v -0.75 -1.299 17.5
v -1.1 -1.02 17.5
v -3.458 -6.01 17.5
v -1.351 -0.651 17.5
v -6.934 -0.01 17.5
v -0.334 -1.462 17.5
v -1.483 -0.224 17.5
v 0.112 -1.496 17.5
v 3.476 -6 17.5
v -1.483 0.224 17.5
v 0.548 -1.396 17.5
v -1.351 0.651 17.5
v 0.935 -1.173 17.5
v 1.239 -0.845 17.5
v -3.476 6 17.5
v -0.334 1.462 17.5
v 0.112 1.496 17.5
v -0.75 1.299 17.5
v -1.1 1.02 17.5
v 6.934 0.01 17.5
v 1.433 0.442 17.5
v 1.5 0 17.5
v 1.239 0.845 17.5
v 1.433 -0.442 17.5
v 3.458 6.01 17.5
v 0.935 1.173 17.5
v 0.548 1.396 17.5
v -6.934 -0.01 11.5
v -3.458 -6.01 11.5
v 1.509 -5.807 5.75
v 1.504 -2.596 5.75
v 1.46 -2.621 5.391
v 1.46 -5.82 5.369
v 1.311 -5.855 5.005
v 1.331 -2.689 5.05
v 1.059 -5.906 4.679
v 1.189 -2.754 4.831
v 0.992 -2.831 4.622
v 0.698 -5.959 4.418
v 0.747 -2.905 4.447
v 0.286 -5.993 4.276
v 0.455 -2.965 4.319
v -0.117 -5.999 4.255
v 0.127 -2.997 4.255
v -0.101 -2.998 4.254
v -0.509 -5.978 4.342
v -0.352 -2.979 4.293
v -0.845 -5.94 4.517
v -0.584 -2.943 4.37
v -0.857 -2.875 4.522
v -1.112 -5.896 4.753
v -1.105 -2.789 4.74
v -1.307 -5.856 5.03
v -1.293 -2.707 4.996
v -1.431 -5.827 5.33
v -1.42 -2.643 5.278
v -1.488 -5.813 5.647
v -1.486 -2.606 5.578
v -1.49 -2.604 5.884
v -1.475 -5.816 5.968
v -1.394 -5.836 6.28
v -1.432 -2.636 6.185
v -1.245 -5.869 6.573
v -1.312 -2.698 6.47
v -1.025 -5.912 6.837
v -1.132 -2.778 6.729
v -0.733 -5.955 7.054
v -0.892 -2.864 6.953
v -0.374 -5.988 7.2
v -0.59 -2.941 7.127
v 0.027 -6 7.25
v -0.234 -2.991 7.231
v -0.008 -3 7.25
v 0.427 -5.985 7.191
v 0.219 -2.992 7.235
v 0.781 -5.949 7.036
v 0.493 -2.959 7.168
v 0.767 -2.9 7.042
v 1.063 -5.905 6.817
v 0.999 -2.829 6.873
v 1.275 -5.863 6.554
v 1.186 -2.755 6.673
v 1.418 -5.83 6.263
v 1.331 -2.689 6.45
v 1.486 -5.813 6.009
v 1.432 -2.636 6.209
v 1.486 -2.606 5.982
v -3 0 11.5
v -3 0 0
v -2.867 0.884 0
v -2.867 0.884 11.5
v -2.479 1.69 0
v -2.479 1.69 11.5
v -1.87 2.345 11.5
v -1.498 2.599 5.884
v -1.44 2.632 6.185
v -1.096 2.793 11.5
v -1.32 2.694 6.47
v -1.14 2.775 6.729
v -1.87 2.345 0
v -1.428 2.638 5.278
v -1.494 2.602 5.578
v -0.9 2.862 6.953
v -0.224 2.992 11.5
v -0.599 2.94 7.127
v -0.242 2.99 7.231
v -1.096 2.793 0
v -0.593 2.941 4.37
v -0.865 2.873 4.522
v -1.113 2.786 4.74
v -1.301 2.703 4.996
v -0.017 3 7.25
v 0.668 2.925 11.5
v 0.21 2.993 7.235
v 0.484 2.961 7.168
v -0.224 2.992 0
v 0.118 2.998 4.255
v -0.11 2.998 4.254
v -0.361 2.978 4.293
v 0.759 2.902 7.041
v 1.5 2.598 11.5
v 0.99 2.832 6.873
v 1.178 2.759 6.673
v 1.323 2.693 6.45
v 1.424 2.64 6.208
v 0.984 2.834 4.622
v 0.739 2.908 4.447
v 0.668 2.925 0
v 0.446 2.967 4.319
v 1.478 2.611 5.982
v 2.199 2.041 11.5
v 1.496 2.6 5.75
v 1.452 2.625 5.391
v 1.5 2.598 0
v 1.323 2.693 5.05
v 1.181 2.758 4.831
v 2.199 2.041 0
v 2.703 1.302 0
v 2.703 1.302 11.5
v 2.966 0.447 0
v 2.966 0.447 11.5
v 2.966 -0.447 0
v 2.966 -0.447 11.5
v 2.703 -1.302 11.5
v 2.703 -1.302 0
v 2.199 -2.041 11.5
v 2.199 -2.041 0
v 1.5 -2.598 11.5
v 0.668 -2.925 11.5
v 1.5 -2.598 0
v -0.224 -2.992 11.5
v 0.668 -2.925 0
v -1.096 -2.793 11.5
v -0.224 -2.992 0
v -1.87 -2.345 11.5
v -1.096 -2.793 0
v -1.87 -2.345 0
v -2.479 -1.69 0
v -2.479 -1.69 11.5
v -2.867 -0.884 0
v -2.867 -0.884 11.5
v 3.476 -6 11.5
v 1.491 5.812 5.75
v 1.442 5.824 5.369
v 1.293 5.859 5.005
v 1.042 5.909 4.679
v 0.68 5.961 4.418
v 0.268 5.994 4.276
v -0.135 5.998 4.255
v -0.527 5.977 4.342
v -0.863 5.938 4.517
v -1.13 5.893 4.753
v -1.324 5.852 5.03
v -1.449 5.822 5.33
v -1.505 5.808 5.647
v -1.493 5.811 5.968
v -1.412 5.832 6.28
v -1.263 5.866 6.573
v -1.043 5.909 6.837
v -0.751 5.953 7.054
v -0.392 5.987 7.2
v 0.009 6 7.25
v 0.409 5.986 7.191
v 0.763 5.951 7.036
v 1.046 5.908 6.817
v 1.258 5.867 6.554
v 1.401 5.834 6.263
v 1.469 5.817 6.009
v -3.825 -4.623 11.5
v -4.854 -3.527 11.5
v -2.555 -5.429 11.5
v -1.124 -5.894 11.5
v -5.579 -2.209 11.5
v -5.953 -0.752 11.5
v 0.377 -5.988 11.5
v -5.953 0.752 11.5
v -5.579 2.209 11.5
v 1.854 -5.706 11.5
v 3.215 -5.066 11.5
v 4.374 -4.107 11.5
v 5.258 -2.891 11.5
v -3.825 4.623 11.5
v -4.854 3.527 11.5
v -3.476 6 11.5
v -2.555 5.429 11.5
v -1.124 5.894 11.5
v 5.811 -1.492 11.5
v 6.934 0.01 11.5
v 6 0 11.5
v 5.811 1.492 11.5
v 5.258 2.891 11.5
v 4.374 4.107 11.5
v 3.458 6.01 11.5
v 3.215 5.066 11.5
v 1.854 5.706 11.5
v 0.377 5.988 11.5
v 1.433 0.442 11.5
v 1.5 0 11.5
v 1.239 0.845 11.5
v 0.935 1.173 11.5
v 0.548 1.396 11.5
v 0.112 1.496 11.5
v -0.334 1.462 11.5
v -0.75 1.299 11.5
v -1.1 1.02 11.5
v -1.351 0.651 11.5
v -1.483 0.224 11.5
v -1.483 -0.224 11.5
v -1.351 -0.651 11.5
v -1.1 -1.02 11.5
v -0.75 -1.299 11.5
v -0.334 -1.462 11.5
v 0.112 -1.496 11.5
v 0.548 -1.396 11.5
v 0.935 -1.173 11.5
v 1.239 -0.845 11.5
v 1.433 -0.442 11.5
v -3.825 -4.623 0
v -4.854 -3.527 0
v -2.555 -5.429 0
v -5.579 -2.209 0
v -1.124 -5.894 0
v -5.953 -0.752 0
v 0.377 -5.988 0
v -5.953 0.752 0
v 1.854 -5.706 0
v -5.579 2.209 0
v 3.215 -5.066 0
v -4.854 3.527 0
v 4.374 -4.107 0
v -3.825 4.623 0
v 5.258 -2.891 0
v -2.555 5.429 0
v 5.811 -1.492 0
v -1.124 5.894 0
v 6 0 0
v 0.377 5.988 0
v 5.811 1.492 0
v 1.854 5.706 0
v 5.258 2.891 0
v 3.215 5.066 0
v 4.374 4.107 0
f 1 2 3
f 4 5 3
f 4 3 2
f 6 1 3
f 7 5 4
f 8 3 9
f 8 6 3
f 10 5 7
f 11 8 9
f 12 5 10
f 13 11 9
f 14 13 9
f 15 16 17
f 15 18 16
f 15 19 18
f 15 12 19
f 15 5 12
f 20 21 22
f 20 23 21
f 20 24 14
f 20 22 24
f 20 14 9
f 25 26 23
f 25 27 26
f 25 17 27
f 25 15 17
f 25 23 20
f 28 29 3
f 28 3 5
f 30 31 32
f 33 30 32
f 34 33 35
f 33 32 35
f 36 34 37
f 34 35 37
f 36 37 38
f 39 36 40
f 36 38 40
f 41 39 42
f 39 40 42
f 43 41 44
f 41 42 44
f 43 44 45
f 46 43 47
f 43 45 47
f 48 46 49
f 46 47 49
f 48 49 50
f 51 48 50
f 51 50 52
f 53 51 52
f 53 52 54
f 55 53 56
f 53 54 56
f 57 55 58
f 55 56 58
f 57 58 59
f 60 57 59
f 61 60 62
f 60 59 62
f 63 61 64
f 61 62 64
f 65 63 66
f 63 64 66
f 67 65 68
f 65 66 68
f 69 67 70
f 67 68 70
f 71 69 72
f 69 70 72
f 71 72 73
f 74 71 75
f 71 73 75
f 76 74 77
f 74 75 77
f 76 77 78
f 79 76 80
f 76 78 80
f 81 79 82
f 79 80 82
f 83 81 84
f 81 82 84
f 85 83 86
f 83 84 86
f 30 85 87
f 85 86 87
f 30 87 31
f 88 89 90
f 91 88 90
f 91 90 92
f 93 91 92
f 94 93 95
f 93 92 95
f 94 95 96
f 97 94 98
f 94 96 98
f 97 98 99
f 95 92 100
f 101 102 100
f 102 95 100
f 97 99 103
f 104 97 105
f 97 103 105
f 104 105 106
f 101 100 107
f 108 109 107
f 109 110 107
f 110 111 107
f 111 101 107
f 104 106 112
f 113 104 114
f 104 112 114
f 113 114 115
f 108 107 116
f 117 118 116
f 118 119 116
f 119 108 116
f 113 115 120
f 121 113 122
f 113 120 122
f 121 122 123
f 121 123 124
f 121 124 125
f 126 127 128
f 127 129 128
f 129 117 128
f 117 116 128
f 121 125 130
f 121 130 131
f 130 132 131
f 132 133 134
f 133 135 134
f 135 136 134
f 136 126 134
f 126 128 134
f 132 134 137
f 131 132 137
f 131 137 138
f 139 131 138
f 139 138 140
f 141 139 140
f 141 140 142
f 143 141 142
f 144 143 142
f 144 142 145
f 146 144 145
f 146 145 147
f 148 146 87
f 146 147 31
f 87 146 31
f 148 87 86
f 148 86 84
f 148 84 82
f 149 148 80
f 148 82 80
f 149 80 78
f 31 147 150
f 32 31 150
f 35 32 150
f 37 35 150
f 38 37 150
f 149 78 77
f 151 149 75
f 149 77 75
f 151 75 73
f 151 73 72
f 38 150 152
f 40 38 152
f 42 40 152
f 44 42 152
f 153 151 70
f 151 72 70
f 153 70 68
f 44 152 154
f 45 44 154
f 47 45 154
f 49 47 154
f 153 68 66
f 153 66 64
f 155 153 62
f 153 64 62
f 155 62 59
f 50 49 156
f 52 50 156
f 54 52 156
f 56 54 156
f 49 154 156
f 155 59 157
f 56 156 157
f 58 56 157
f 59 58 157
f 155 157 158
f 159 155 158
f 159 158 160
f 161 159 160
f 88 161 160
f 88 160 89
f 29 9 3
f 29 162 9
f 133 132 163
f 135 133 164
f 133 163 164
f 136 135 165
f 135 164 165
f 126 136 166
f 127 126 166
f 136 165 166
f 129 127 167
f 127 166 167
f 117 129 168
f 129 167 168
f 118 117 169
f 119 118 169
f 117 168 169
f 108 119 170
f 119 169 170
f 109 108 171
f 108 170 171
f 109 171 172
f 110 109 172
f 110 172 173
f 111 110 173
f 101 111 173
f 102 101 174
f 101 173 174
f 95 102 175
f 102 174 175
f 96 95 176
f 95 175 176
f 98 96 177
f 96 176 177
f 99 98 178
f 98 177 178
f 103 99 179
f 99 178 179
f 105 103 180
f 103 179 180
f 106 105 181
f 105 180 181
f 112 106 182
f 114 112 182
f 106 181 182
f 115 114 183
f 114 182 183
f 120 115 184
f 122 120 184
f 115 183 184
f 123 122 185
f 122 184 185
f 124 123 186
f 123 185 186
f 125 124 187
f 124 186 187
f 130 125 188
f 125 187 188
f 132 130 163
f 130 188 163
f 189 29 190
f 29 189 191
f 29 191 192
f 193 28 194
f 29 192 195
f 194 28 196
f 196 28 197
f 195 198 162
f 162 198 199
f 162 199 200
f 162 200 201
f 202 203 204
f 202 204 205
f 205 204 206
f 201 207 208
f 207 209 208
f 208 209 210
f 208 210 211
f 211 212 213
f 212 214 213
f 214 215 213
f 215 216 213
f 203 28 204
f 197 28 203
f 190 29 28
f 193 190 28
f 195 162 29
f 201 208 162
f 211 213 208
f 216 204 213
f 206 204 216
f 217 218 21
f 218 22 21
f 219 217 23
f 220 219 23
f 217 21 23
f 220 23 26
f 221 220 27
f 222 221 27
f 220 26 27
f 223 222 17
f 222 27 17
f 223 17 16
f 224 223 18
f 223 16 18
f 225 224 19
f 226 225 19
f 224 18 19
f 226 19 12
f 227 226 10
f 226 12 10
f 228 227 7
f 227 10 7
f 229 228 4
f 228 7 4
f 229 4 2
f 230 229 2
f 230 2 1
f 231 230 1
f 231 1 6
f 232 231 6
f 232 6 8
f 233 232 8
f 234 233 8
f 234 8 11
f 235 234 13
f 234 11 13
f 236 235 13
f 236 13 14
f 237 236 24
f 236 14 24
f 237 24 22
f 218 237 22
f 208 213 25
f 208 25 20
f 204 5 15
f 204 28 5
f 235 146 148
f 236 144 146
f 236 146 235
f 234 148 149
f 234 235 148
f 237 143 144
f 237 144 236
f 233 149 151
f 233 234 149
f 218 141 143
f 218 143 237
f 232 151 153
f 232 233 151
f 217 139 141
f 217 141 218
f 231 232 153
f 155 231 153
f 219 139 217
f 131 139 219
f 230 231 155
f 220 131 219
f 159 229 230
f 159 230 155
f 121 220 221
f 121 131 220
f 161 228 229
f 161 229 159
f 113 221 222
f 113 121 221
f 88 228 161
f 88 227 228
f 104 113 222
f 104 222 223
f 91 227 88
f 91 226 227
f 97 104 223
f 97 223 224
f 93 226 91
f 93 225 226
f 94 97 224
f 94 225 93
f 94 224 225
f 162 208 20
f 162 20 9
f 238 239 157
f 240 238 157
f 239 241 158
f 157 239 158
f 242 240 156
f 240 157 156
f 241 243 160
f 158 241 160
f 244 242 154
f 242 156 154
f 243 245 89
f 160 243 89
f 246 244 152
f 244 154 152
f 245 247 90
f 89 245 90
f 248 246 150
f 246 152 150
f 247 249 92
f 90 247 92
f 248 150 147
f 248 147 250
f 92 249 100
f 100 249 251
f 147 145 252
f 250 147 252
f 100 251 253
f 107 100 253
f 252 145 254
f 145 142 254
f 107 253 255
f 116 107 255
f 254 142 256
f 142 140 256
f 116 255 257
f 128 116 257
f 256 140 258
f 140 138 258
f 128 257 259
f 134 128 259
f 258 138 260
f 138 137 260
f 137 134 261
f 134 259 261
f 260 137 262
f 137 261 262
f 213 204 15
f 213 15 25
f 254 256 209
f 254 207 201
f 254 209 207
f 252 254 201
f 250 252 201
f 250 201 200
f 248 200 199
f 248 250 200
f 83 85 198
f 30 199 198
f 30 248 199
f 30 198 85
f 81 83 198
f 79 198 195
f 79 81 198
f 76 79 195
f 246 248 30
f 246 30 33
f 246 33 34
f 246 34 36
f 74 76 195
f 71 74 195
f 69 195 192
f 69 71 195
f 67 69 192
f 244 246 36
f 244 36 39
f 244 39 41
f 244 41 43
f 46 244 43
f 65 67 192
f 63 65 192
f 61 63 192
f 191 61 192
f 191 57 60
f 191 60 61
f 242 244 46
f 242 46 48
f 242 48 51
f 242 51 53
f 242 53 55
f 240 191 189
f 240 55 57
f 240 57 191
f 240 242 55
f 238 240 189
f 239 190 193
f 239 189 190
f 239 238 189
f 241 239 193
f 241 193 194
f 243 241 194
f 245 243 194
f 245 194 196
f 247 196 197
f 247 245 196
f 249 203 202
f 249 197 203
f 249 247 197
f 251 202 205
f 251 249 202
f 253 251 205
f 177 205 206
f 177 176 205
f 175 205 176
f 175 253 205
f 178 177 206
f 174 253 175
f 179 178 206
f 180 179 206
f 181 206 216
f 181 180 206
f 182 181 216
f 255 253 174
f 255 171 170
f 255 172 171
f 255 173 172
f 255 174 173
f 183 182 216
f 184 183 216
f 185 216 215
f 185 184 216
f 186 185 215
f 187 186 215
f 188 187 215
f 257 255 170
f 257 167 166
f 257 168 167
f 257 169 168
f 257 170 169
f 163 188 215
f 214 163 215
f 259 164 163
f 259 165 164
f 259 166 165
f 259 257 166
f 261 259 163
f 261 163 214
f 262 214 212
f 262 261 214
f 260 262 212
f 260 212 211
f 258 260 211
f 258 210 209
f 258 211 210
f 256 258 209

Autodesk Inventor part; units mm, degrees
ref_plane "YZ Plane" through (0, 0, 0) normal (1, 0, 0) x (0, 1, 0)
ref_plane "XZ Plane" through (0, 0, 0) normal (0, 1, 0) x (-1, 0, 0)
ref_plane "XY Plane" through (0, 0, 0) normal (0, 0, 1) x (1, 0, 0)
sketch "Sketch2" plane through (0, 0, 0) normal (0, 0, 1) x (1, 0, 0)
  circle A0 centre (0, 0) radius 6
  dimension "d3" = 12
extrude "Extrusion2" add sketch "Sketch2" along normal blind 11.5
sketch "Sketch3" plane through (0, 0, 11.5) normal (0, 0, 1) x (1, 0, 0)
  line L0 (-3.476, 6) -> (3.4581, 6.0103)
  line L1 (3.4581, 6.0103) -> (6.9342, 0.0103)
  line L2 (6.9342, 0.0103) -> (3.476, -6)
  line L3 (3.476, -6) -> (-3.4581, -6.0103)
  line L4 (-3.4581, -6.0103) -> (-6.9342, -0.0103)
  line L5 (-6.9342, -0.0103) -> (-3.476, 6)
  point P0 (0, 0)
  point P1 (0, 0)
sketch "Sketch4" plane through (0, 0, 0) normal (0, 0, -1) x (-1, 0, 0)
  circle A0 centre (0, 0) radius 3
  dimension "d6" = 6
extrude "Extrusion3" add sketch "Sketch3" along normal blind 6
extrude "Extrusion4" cut sketch "Sketch4" against normal up to surface (11.5 mm away)
sketch "Sketch5" plane through (-3.476, 6, 17.5) normal (-0.0014906, 0.9999989, 0) x (0.9999989, 0.0014906, 0)
  line L0 (0, 0) -> (-3.4671, 0) projected
  line L1 (6.9342, 6) -> (6.9342, 0) projected
  line L2 (0, 0) -> (6.9342, 0)
  line L3 (6.9342, 0) -> (6.9342, 6)
  line L4 (6.9342, 6) -> (0, 6)
  line L5 (0, 6) -> (0, 0)
  line L6 (3.4671, 0) -> (3.4671, 17.5) construction
  line L7 (6.9342, 6) -> (0, 6) construction
  line L8 (6.9342, 6) -> (0, 6) construction
  circle A0 centre (3.4671, 11.75) radius 1.5
  dimension "d11" = 3
extrude "Extrusion5" cut sketch "Sketch5" against normal through all contours A0
sketch "Sketch6" plane through (0, 0, 17.5) normal (0, 0, 1) x (1, 0, 0)
  circle A0 centre (0, 0) radius 1.5
  dimension "d14" = 3
extrude "Extrusion6" cut sketch "Sketch6" against normal blind 10
properties part number "Wheel Test" material "Brass"
